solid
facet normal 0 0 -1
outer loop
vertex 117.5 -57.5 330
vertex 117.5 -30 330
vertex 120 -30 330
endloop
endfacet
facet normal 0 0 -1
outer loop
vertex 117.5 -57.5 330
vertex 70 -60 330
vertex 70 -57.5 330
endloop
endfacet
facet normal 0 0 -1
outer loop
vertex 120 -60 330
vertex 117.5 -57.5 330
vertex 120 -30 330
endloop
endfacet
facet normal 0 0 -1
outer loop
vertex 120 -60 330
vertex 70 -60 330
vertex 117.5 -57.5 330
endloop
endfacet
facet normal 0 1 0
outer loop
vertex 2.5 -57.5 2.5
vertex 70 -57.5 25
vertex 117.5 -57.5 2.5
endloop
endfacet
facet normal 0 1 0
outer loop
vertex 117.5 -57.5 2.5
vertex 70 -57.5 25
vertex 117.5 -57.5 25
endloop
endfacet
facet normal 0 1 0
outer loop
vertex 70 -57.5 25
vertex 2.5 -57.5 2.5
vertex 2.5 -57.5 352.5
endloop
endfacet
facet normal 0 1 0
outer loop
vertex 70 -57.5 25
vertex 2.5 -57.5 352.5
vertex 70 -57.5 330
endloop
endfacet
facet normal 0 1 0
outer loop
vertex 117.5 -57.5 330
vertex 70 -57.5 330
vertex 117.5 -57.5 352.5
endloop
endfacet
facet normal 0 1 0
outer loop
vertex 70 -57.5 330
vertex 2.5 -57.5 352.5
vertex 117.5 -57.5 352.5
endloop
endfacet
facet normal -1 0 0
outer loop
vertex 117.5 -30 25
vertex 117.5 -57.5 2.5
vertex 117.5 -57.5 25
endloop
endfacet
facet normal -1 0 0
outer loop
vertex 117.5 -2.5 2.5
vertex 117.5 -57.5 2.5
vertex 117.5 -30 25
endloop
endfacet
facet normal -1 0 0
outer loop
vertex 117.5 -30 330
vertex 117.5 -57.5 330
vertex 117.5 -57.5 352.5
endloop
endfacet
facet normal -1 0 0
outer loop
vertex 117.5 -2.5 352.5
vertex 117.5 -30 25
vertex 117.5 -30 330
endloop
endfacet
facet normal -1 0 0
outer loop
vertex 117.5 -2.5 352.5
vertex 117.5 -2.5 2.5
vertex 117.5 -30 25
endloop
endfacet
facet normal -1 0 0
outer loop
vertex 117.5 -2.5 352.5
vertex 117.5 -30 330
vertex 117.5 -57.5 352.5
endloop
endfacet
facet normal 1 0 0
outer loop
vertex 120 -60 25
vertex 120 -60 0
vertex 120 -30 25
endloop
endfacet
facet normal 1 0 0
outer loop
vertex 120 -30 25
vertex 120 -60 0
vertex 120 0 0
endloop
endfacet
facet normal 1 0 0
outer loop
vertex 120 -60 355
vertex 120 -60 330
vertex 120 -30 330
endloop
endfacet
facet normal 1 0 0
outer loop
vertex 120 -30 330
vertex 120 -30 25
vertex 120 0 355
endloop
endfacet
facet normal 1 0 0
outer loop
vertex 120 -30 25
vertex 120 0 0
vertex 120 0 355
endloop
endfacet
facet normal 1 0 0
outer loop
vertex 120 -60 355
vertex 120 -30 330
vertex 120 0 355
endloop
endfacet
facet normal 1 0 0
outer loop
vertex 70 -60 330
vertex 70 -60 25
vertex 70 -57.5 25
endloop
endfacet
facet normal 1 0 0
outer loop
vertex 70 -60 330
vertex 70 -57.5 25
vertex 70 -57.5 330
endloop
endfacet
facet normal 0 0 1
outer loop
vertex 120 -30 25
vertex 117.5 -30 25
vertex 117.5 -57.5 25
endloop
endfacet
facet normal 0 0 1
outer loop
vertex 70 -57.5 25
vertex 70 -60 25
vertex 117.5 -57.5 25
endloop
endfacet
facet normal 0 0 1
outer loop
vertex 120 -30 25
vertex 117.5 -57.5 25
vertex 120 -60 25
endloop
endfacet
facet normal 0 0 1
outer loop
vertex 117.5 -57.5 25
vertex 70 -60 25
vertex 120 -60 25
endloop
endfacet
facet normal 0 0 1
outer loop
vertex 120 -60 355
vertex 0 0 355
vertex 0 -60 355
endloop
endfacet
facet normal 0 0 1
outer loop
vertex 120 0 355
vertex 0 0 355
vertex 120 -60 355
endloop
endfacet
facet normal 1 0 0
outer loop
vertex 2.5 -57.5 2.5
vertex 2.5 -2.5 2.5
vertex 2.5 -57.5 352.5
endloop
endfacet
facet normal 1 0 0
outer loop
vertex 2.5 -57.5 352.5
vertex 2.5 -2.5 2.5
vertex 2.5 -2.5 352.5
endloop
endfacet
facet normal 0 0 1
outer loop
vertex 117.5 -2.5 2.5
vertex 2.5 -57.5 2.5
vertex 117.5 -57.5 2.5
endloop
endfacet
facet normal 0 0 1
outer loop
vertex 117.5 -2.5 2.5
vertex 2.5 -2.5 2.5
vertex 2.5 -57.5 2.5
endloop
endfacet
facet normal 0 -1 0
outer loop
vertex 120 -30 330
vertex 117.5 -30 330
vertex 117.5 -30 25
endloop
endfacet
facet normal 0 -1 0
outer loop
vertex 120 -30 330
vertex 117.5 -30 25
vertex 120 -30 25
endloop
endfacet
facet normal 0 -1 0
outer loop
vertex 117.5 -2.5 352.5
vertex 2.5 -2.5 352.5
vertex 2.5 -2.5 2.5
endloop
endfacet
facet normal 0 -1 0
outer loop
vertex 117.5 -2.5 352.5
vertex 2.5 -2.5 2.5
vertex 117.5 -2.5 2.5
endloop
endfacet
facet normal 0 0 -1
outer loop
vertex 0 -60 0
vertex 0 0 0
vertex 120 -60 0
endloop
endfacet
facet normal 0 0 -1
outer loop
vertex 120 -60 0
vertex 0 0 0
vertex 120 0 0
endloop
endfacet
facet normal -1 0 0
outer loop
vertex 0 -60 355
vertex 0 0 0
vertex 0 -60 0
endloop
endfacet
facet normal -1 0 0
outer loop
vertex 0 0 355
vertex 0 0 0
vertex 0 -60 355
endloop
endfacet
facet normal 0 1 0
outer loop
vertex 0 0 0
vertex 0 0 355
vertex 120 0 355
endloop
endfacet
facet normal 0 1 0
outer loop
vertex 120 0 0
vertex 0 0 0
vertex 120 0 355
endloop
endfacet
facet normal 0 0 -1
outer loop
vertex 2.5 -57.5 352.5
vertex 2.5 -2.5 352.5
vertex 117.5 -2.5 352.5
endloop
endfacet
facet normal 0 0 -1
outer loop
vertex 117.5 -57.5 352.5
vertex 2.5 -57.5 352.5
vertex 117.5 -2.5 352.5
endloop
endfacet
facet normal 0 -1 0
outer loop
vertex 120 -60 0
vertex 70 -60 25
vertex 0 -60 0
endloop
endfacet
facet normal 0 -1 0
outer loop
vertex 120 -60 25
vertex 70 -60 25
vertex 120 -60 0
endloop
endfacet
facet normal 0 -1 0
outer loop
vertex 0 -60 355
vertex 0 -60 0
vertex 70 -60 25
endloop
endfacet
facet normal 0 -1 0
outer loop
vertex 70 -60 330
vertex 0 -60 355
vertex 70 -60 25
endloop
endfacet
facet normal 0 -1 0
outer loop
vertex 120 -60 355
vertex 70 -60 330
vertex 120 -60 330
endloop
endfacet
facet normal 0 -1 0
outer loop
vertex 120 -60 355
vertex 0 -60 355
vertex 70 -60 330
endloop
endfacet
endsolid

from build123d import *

# Parameters (mm, degrees)
F0_W     = 120
F0_H     = 355
F1_DEPTH = 60
F2_W     = 100
F2_H     = 305
F3_DEPTH = 30
F4_T     = -2.5


with BuildPart() as f1:
    # F0 (on Front) → F1 (new body)
    with BuildSketch(Plane.XZ):
        with Locations((60, 177.5)):
            Rectangle(F0_W, F0_H)
    extrude(amount=F1_DEPTH)

    # F2 (on face) → F3 (cut)
    with BuildSketch(Plane.XZ.offset(60)):
        with Locations((120, 177.5)):
            Rectangle(F2_W, F2_H)
    extrude(amount=-F3_DEPTH, mode=Mode.SUBTRACT)

    # F4
    f4_openings = [f1.faces().sort_by_distance(p)[0] for p in [
        (95, -45, 330),
        (70, -45, 177.5),
        (95, -30, 177.5),
        (95, -45, 25),
    ]]
    offset(amount=F4_T, openings=f4_openings)


solid = f1.part
